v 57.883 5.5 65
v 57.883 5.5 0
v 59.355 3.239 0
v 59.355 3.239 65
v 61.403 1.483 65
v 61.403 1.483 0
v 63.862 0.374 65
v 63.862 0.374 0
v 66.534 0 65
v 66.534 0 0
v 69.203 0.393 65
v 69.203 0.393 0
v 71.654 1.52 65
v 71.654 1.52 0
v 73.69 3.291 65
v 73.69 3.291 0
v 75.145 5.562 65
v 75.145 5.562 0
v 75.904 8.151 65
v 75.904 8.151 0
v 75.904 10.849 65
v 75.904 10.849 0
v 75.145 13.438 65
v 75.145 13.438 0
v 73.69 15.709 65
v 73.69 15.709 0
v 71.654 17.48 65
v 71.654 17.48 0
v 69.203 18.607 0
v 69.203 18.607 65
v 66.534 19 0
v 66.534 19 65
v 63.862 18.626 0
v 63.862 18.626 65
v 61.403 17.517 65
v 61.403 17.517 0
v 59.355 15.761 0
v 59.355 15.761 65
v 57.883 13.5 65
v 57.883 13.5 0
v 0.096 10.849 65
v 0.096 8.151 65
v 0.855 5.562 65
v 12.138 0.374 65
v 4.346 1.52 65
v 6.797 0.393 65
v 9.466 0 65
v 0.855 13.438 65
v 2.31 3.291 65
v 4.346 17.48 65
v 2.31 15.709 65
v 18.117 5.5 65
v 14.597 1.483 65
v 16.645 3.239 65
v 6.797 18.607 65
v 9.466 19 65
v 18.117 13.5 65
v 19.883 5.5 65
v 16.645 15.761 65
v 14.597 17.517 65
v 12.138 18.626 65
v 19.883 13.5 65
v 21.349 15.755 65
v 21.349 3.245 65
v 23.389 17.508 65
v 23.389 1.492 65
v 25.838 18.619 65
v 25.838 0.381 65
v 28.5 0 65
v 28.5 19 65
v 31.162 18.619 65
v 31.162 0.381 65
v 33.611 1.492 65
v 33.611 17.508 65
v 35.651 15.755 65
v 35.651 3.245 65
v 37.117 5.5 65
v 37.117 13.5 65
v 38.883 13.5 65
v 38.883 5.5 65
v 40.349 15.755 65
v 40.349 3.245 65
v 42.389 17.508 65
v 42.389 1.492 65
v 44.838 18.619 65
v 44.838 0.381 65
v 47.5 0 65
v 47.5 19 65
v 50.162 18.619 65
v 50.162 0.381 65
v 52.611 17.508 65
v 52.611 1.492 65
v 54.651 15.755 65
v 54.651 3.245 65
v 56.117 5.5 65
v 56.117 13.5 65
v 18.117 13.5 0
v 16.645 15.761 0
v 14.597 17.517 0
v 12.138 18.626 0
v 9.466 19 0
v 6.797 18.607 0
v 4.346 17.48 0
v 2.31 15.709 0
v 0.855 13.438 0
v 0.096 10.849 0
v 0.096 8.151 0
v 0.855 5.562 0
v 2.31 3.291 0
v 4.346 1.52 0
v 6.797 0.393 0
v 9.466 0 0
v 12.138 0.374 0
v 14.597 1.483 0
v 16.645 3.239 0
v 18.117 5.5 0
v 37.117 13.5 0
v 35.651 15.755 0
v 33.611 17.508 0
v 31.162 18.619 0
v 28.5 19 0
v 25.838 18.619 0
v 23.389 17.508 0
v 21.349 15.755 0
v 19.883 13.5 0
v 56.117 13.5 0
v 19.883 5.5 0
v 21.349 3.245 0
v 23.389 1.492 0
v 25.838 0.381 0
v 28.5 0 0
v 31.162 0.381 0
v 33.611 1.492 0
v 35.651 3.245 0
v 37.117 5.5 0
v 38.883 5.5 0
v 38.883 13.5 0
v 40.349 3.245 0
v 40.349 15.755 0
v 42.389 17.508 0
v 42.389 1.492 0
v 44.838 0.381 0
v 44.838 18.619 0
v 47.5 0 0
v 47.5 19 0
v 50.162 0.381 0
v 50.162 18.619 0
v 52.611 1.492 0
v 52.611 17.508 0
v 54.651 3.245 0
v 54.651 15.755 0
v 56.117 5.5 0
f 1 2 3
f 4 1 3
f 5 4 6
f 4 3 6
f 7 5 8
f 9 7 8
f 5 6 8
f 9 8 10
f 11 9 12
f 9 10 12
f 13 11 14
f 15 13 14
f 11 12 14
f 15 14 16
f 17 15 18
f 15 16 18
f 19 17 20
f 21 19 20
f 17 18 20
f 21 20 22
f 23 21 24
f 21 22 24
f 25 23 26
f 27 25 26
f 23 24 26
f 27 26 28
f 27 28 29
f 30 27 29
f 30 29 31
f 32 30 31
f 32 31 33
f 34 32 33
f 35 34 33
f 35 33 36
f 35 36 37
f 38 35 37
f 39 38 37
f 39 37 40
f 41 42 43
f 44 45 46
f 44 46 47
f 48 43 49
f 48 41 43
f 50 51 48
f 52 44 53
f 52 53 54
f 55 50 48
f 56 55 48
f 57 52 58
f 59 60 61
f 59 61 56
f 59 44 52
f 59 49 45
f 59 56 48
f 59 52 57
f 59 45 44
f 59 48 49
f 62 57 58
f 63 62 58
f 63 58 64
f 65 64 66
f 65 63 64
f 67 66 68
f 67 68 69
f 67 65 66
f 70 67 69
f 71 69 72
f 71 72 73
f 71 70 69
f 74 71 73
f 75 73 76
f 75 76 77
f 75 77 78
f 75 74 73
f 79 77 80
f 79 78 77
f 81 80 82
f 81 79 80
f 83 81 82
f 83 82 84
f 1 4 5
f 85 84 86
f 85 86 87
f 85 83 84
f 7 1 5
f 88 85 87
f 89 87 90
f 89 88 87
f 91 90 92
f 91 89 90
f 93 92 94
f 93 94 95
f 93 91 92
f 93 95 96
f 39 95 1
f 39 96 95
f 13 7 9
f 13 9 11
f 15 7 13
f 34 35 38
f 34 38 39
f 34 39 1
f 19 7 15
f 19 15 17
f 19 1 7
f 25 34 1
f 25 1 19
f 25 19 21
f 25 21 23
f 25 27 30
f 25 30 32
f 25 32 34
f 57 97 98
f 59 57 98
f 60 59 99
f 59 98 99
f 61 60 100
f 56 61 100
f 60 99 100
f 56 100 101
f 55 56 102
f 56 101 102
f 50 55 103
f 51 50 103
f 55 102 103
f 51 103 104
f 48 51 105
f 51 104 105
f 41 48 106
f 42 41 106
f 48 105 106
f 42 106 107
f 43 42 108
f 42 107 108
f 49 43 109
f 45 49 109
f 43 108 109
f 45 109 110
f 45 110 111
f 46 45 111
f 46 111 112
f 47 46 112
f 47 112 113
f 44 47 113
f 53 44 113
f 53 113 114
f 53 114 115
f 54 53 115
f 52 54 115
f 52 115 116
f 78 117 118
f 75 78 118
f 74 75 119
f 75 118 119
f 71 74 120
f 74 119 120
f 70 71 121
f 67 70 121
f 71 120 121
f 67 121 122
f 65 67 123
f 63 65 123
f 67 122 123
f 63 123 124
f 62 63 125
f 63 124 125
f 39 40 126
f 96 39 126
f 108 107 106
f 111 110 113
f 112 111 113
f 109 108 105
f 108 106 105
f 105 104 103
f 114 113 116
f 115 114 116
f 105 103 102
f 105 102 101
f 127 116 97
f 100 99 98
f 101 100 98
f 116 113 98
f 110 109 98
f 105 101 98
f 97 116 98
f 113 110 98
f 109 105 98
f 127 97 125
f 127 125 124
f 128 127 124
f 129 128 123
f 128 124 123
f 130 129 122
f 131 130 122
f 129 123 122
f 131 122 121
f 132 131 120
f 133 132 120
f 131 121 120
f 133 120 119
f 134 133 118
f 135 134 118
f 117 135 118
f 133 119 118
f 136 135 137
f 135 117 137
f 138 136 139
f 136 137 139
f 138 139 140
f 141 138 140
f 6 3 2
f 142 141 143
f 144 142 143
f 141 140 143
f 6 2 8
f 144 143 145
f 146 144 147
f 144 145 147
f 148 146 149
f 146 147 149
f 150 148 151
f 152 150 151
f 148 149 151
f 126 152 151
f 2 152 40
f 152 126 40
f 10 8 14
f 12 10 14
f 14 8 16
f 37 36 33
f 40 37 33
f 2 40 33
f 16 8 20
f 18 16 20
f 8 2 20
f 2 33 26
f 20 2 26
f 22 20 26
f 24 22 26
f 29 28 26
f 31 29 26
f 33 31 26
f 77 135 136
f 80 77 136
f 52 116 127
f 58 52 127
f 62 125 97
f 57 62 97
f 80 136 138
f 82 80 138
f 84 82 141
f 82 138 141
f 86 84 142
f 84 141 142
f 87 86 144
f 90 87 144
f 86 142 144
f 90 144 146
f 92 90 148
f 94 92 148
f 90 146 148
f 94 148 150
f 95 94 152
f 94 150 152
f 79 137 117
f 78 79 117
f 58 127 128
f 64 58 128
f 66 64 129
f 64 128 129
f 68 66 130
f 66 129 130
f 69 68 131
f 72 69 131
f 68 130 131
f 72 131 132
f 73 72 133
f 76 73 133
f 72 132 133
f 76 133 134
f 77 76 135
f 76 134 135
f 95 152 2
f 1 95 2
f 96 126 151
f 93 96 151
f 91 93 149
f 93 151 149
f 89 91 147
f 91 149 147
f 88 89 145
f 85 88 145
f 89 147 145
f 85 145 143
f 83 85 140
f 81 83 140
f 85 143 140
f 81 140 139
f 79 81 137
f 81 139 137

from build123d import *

# Parameters (mm, degrees)
PAD_DEPTH = 65


with BuildPart() as part:
    # Sketch → Pad (new body)
    with BuildSketch(Plane.XY):
        with BuildLine():
            ThreePointArc((18.116844, 13.5), (0, 9.5), (18.116844, 5.5))
            Line((18.116844, 5.5), (19.883156, 5.5))
            ThreePointArc((19.883156, 5.5), (28.5, 0), (37.116844, 5.5))
            Line((37.116844, 5.5), (38.883156, 5.5))
            ThreePointArc((38.883156, 5.5), (47.5, 0), (56.116844, 5.5))
            Line((56.116844, 5.5), (57.883156, 5.5))
            ThreePointArc((57.883156, 5.5), (76, 9.5), (57.883156, 13.5))
            Line((57.883156, 13.5), (56.116844, 13.5))
            ThreePointArc((56.116844, 13.5), (47.5, 19), (38.883156, 13.5))
            Line((38.883156, 13.5), (37.116844, 13.5))
            ThreePointArc((37.116844, 13.5), (28.5, 19), (19.883156, 13.5))
            Line((19.883156, 13.5), (18.116844, 13.5))
        make_face()
    extrude(amount=PAD_DEPTH)


solid = part.part
